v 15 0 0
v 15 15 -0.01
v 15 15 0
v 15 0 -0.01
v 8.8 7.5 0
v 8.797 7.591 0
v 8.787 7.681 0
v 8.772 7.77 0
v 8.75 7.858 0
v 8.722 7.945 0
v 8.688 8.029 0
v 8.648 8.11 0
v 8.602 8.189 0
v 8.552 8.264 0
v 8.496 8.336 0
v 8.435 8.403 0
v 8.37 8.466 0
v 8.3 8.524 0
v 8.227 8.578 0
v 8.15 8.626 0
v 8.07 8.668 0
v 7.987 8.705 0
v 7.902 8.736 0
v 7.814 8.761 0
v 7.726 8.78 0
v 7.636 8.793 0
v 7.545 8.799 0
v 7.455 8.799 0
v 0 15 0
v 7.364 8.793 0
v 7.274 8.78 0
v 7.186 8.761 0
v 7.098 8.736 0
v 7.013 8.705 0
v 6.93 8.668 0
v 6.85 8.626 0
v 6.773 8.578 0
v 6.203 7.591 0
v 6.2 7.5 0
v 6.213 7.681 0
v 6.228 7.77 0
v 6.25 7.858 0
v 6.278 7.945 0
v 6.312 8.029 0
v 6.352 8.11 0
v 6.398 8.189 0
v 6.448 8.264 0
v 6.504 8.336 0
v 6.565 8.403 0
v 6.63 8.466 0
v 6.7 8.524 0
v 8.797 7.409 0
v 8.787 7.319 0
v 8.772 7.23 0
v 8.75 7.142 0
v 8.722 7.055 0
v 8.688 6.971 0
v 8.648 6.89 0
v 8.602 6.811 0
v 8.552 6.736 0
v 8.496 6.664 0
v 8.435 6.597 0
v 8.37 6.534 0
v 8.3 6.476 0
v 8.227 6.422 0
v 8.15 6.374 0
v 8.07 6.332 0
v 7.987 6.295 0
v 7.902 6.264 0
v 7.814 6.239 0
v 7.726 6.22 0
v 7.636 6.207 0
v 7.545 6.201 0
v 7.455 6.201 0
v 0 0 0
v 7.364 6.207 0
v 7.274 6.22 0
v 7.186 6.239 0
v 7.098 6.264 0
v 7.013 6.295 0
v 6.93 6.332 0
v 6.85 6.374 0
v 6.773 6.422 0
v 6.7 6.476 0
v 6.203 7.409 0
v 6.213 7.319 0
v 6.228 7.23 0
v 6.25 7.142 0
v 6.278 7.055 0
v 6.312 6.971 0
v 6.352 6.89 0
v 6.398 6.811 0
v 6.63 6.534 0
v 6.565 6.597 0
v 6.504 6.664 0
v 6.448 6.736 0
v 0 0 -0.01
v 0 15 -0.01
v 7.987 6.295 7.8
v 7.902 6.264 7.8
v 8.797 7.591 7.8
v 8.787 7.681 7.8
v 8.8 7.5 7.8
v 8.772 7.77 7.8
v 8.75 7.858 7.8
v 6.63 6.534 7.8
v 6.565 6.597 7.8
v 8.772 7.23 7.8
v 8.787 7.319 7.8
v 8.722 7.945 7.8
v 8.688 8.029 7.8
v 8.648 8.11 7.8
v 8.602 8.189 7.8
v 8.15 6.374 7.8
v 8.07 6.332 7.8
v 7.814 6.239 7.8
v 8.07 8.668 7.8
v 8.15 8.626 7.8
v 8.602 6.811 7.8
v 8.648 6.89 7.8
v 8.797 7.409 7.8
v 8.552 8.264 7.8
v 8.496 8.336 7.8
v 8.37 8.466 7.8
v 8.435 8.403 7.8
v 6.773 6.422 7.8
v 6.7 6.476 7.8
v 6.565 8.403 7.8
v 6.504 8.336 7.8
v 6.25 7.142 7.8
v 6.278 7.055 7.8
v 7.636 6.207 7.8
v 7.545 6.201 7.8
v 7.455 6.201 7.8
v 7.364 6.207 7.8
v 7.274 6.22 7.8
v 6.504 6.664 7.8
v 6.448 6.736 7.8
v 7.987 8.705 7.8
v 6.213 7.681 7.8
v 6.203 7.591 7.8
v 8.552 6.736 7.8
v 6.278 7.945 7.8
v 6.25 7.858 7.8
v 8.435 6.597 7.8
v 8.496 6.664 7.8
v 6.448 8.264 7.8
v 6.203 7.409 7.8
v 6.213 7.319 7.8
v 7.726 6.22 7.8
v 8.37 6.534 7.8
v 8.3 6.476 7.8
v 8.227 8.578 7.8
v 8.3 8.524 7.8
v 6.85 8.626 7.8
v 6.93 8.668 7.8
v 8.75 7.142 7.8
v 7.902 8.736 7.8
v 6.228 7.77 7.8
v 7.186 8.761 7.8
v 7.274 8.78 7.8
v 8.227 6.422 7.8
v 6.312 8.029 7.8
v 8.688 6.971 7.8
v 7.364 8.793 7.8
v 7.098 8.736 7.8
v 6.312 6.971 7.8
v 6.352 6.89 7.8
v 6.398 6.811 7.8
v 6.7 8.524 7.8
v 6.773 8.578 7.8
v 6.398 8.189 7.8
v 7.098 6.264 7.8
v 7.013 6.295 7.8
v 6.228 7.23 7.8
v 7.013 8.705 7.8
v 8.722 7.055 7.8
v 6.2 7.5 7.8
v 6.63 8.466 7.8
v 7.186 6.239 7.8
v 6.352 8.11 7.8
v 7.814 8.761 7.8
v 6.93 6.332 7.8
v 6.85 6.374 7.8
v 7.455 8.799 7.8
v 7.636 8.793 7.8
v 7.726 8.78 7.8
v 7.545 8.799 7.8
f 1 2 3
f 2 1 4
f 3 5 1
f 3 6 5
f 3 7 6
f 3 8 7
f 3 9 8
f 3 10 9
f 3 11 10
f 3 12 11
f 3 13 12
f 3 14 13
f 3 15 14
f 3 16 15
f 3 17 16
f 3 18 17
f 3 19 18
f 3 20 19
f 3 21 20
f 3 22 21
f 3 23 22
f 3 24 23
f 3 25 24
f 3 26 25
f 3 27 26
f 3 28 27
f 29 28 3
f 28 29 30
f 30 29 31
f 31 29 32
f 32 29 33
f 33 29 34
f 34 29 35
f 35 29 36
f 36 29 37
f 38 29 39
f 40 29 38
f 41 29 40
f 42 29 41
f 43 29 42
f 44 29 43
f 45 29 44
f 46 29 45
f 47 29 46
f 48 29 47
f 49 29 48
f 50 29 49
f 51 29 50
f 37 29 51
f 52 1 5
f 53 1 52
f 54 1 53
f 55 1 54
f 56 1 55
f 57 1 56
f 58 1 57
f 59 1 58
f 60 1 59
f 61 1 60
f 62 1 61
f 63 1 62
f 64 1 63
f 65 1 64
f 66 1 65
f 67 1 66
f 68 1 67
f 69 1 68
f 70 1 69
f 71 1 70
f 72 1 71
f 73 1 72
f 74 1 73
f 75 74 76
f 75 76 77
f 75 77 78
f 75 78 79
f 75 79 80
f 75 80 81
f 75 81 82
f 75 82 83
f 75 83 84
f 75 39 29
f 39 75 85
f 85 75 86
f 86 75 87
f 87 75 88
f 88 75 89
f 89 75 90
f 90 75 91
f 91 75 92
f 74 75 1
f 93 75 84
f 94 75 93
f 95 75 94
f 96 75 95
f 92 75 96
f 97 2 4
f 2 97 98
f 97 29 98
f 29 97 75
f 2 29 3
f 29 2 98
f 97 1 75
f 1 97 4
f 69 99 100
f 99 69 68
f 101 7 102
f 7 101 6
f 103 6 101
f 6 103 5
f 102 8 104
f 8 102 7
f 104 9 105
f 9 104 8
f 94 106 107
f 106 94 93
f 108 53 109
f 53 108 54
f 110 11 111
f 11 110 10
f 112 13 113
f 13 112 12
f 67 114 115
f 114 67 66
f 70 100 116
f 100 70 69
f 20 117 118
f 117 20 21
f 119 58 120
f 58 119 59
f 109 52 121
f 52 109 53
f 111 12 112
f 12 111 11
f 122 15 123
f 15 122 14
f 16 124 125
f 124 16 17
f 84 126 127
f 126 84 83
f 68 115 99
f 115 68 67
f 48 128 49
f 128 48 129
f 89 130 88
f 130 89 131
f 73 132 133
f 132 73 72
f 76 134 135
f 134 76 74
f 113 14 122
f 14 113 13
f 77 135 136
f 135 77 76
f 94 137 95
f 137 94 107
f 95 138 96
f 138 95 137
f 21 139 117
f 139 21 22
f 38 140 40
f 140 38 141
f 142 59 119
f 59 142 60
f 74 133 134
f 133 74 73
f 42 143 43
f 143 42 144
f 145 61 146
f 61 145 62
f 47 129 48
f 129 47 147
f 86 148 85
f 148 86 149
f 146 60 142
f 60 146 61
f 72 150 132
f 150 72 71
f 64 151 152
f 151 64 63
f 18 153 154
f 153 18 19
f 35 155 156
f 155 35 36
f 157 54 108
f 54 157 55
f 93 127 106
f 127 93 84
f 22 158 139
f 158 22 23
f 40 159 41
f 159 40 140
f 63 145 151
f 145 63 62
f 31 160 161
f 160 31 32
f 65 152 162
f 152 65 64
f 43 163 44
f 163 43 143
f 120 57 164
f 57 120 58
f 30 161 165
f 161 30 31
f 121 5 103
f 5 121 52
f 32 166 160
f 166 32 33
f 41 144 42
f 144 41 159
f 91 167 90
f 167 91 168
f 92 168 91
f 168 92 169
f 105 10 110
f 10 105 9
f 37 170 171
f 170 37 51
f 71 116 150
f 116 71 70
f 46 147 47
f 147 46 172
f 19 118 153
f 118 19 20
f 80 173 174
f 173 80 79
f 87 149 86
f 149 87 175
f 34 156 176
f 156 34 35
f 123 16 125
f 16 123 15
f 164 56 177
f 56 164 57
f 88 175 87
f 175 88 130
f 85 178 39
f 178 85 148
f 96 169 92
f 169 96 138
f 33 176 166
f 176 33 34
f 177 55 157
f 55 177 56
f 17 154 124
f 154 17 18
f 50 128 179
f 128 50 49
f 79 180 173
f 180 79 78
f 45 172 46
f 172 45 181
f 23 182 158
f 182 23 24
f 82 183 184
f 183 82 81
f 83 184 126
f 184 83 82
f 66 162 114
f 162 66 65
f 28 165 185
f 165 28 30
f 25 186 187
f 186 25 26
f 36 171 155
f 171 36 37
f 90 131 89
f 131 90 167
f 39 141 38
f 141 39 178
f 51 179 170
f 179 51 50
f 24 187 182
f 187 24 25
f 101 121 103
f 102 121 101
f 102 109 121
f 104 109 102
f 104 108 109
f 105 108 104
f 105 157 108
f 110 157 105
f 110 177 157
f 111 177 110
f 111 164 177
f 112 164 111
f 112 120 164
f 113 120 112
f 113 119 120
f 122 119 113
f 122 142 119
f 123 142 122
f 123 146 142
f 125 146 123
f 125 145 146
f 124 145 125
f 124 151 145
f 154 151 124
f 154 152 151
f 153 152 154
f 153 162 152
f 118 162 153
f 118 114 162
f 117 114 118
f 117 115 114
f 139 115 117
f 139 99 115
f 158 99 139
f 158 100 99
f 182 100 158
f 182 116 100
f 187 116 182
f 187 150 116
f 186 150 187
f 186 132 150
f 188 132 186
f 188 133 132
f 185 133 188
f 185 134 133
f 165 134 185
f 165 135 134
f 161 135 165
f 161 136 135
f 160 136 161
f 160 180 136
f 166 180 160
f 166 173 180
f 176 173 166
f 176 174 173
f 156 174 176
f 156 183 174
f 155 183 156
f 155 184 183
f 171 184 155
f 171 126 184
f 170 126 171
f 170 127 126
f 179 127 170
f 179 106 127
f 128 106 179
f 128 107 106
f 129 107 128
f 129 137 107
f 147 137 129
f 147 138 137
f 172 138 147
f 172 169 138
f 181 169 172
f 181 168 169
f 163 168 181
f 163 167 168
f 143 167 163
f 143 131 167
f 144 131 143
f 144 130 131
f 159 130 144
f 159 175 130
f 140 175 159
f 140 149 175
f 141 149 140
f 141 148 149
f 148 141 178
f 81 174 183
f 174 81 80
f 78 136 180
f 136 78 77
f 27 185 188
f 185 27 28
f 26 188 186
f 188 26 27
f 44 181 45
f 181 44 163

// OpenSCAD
// file: ../Base/Rotation.scad
// Fischertechnik Box Foundation
// Geometry Helpers Rotation

include <PlacementOptions.scad>

// getRotatedSpace(space, rotation=NoRotation)
// Rotates the space dependent on the specified rotation

function getRotatedSpace(space, rotation=NoRotation) = [
    (rotation == Rotate90 || rotation == Rotate270) ? space.y : space.x,
    (rotation == Rotate90 || rotation == Rotate270) ? space.x : space.y
];

// Rotates the given space around the fixed left lower corner
// space = the space the children needs as width/depth list [width,depth]
// rotation = 0 Rotate0 degrees, 1 Rotate90 degrees, 2 Rotate180 degrees, 3 Rotate270 degrees (equivalent to -90)

module RotateFix(space, rotation=NoRotation) {
    dy = (rotation == Rotate0 || rotation == Rotate270) ? 0 :
        (rotation == Rotate90) ? space.x :
        space.y;
    dx = (rotation < Rotate180) ? 0 :
        (rotation == Rotate180) ? space.x :
        space.y;
    
    translate([dx, dy, 0])
        rotate([0, 0, rotations[rotation]])
            children();
}
// file: ../Base/Alignment.scad
// Fischertechnik Box Foundation
// Geometry Helpers Alignment

include <PlacementOptions.scad>

// getAlignedX(elementWidth, spaceWidth, align=AlignRight, offset=0)
// Gets the aligned X offset of an element with the given
// width in the given space.
// elementWidth = The width of the element to positon
// spaceWidth = The space where the element should be aligned
// align = 0 AlignLeft, 1 AlignCenter, 2 AlignRight
// offset = an optional offset from the aligned position. When
// aligned left or centered, then positive values are in X direction.
// When aligned right then positive values are in negative X direction.

function getAlignedX(elementWidth, spaceWidth, align=AlignRight, offset=0) =
    (align == AlignLeft) ?
        offset :
        ((align == AlignCenter) ?
        (spaceWidth - elementWidth)/2 + offset :
        spaceWidth - offset - elementWidth);

// getAlignedY(elementDepth, spaceDepth, align=AlignTop, offset=0)
// Gets the aligned Y offset of an element with the given
// depth in the given space.
// elementDepth = The depth of the element to positon
// spaceDepth = The space where the element should be aligned
// align = 0 AlignBottom, 1 AlignCenter, 2 AlignTop
// offset = an optional offset from the aligned position. When
// aligned bottom or centered, then positive values are in Y direction.
// When aligned top then positive values are in negative Y direction.

function getAlignedY(elementDepth, spaceDepth, align=AlignTop, offset=0) =
    (align == AlignBottom) ?
        offset :
        ((align == AlignCenter) ?
        (spaceDepth - elementDepth)/2 + offset :
        spaceDepth - offset - elementDepth);
// file: ../Base/PlacementOptions.scad
// Fischertechnik Box Foundation
// Placement Options

// Alignment
NoAlign = 0;
AlignLeft = 1;
AlignBottom = 2;
AlignCenter = 3;
AlignRight = 4;
AlignTop = 5;

// Element rotation degree steps
rotations = [0, -90, -180, -270];

// Rotation
NoRotation = 0;
Rotate0 = 0;
Rotate90 = 1;
Rotate180 = 2;
Rotate270 = 3;

// Docking (seen from above)
NoDock = -1;
DockLeft = 0;
DockTop = 1;
DockRight = 2;
DockCorner = 2;
DockBottom = 3;

// Web corners
LowerLeft = 0;
UpperLeft = 1;
UpperRight = 2;
LowerRight = 3;

// Web position relative to corner
LeftOfCorner = 0;
RightOfCorner = 1;

// Rails direction
Horizontal = true;
Vertical = false;
// file: ../Base/Boxes.scad
// Fischertechnik Box Foundation
// Pre-designed Boxes

use <Constants.scad>

include <PlacementOptions.scad>

box190Width = 190;
box190Depth = 130;
box130Width = 130;
box130Depth = 95;

// Values are from an original ec3 box
topBottomDifference = 1.5;
outerHeight = 40;
baseThickness = 1.8;
innerHeight = outerHeight - baseThickness;
stackExcess = 5.7;
radius = 3.5;
wallThickness = 1.5;
tolerance = 0.2;

boxWallThickness = wallThickness;
boxBaseThickness = baseThickness;
boxWebWidth = 3.0;

// getBoxWallThickness()
// Gets the wall thickness of a Fischertechnik Box
function getBoxWallThickness() = boxWallThickness;

// getBoxUsageHeight(height = 38.2)
// Gets the usable height of a Fischertechnik box
// height = Outer height of the box from the bottom to the upper edge.
function getBoxUsageHeight(height = outerHeight) = height - baseThickness - stackExcess;

// getBoxInnerHeight()
// Gets the inner height of a Fischertechnik box, including the stack excess
function getBoxInnerHeight() = innerHeight;

// getBoxBaseThickness()
// Gets the thickness of the Fischertechnik box base.
function getBoxBaseThickness() = boxBaseThickness;

// getBoxWebWidth()
// Gets the width of a box web
function getBoxWebWidth() = boxWebWidth;

// getBox190Space()
// Gets the usable inner space of a Box 190 as an x/y-list
function getBox190Space() = [
    box190Width - 2*getBoxWallThickness() - topBottomDifference, 
    box190Depth - 2*getBoxWallThickness() - topBottomDifference ];

// RoundedCornerPlate(width, depth, height, radius)
// Creates a body plate with rounded corners for a box. Used
// also to create the complete box with the hull module.
// width = Width of the plate
// depth = depth of the plate 
// height = thickness of the plate
// radius = radius of the rounded corner
module RoundedCornerPlate(width, depth, height, radius) {
    translate([radius, radius])
    hull() {
        w = width-2*radius;
        d = depth-2*radius;
        cube([w, d, height]);
        cylinder(height, r=radius, $fn=getFragments());
        translate([w, 0])
            cylinder(height, r=radius, $fn=getFragments());
        translate([w, d])
            cylinder(height, r=radius, $fn=getFragments());
        translate([0, d])
            cylinder(height, r=radius, $fn=getFragments());
    }
}

// BoxBase(width, depth)
// Creates an empty stackable Fischertechnik compatible box
// width = Outer width of the box (190, 130, ...)
// depth = Outer depth of the box (130, 95, ...)

module BoxBase(width, depth, height=outerHeight) {    
    thinPlate = 0.01;

    innerHeight = height - baseThickness;    
    
    module Body(tolerance=tolerance) {
        hull() {
            // Bottom with tolerance to fit into the original boxes when stacked
            translate([-wallThickness+tolerance, -wallThickness+tolerance, -baseThickness])
                RoundedCornerPlate(width-topBottomDifference-2*tolerance, depth-topBottomDifference-2*tolerance, thinPlate, radius);
            
            // Top
            translate([-wallThickness-topBottomDifference/2, -wallThickness-topBottomDifference/2, innerHeight-thinPlate])
                RoundedCornerPlate(width, depth, thinPlate, radius);
         }
    }

    module Cutoff() {
        hull() {
            coWidth = width - 2*wallThickness;
            coDepth = depth - 2*wallThickness;
            
            // Bottom
            RoundedCornerPlate(coWidth-topBottomDifference, coDepth-topBottomDifference, thinPlate, radius);

            // Top
            translate([-topBottomDifference/2, -topBottomDifference/2, innerHeight+thinPlate]) 
                RoundedCornerPlate(coWidth, coDepth, thinPlate, radius);
        }
    }
    
    difference() {        
        Body();
        Cutoff();
        stackOffset = innerHeight - stackExcess;
        translate([0, 0, stackOffset + baseThickness])
            Body(tolerance=0);
    }
}

// Creates the Fischertechnik empty box 130x190 mm and places it at position 0,0
// 190x130 are the outer sizes, the inner space is slightly smaller. Use getBox190Space() to get the inner sizes.
// The box is positioned that the usable inner space is at the 0,0,0 position.

module Box190() {
    BoxBase(box190Width, box190Depth);
}

// Gets the usable inner space of a Box 130 as an x/y-list
function getBox130Space() = [
    box130Width - 2*getBoxWallThickness() - topBottomDifference, 
    box130Depth - 2*getBoxWallThickness() - topBottomDifference ];

// Creates the Fischertechnik empty box 95x130 mm and places it at position 0,0
// 190x130 are the outer sizes, the inner space is slightly smaller. Use getBox190Space() to get the inner sizes.
// The box is positioned that the usable inner space is at the 0,0,0 position.

module Box130() {
    BoxBase(box130Width, box130Depth);
}

// Creates a web at the specified box walls
// corner 0 = LowerLeft, 1 = UpperLeft, 2 = UpperRight, 3 = LowerRight
// side 0 = LeftOfCorner, 1 = RightOfCorner
// distance = Distance in mm from the corner
// boxSpace = inner width and depth of the box (default: Box 190)
// webWidth = length of the web (default is 3 mms)
// webThickness = thickness of the web (default is 1 mm)
// height = Height of the web (standard is getBoxUsageHeight())
// sink = How much of the web is sunk into the wall

module BoxWeb(
    corner, 
    side, 
    distance, 
    boxSpace=getBox190Space(), 
    webWidth=getBoxWebWidth(), 
    webThickness=1.0, 
    height=getBoxUsageHeight(),
    sink = getBoxWallThickness()/2) {
    width = (corner % 2 == 0) ? 
            (side == LeftOfCorner ? webWidth : webThickness) :
            (side == LeftOfCorner ? webThickness : webWidth);

    depth = (corner % 2 == 0) ? 
            (side == RightOfCorner ? webWidth : webThickness) :
            (side == RightOfCorner ? webThickness : webWidth);
    
    xDiff = corner == LowerLeft ? 
                (side == LeftOfCorner ? -sink : distance) :
            (corner == UpperLeft ?                
                (side == LeftOfCorner ? distance : -sink) :
            (corner == UpperRight ?
                (side == LeftOfCorner ? boxSpace.x-webWidth+sink : boxSpace.x-distance-webThickness) :
                (side == LeftOfCorner ? boxSpace.x-distance-webThickness: boxSpace.x-webWidth+sink)));

    yDiff = corner == LowerLeft ? 
                (side == RightOfCorner ? -sink : distance) :
            (corner == UpperLeft ?
                (side == RightOfCorner ? boxSpace.y-distance-webThickness : boxSpace.y-webWidth+sink) :
            (corner == UpperRight ?
                (side == RightOfCorner ? boxSpace.y-webWidth+sink : boxSpace.y-distance-webThickness) :
                (side == RightOfCorner ? distance : -sink)));
    
    translate([xDiff, yDiff, -getExcess()])
        cube([width, depth, height + 2*getExcess()]);
}
// file: ../Base/Placement.scad
// Fischertechnik Box Foundation
// Geometry Helpers Placement

use <Constants.scad>
use <Alignment.scad>
use <Rotation.scad>
use <Boxes.scad>

include <PlacementOptions.scad>

// Place(x=0, y=0, elementSpace=[0,0], alignX=AlignLeft, alignY=AlignBottom, rotation=Rotate0, boxSpace=getBox190Space())
// Places the child at the specified position
// y = Y-Position. This is a relative position when an X aligment is specified.
// x = X-Position. This is a relative position when an Y aligment is specified.
// elementSpace = space of the element to be placed [x,y]
// alignX = -1=NoAlign, 0 AlignLeft, 1 AlignCenter, 3 AlignRight (elementSpace and boxSpace required!)
// alignY = -1=NoAlign, 2 AlignBottom, 1 AlignCenter, 4 AlignTop (elementSpace and boxSpace required!)
// rotation = 0 Rotate0 0 degrees, 1 Rotate90 90 degrees, 
// 2 Rotate180 180 degrees, 3 Rotate270 270 degrees (equivalent to -90)
// boxSpace = Inner space of the box where the placement occurs [x,y] - default is Box 190x130 inner space

module Place(x=0, y=0, elementSpace=[0,0], 
  alignX=AlignLeft, alignY=AlignBottom, 
  rotation=NoRotation, boxSpace=getBox190Space()) {

    module Position(x, y, space, rotation=Rotate0) {
        translate([x, y, 0])
            RotateFix(space, rotation)
                children();
    }

    space = getRotatedSpace(elementSpace, rotation);
    alignedX = getAlignedX(space.x, boxSpace.x, alignX, x);
    alignedY = getAlignedY(space.y, boxSpace.y, alignY, y);
    Position(alignedX, alignedY, elementSpace, rotation)
        children();
}

// Center(space=getBox130Space(), elementSpace=[0,0])
// space = Space where the children is centered. For cylinder use centered=true and no elementSpace.
// elementSpace = space of the element to be centered [x,y]

module Center(space=getBox190Space(), elementSpace=[0,0]) {
    Place(elementSpace=elementSpace, boxSpace=space, alignX=AlignCenter, alignY=AlignCenter)
        children();
}

// CenterHorizontal(width=0, y=0, offset=0, space=getBox130Space())
// width = Width of the element to be placed.
// y = Y position of the element
// offset = Offset from the center position (negative will be left of the center)
// space = Space where the element is placed

module CenterHorizontal(width=0, y=0, offset=0, space=getBox190Space()) {
    Place(x=offset, y=y, elementSpace=[width, 0], boxSpace=space, alignX=AlignCenter)
        children(0);
}

// CenterVertical(depth=0, x=0, offset=0, space=getBox130Space())
// depth = Depth of the element to be placed.
// x = X position of the element
// offset = Offset from the center position (negative will be down of the center)
// space = Space where the element is placed

module CenterVertical(depth=0, x=0, offset=0, space=getBox190Space()) {
    Place(x=x, y=offset, elementSpace=[0, depth], boxSpace=space, alignY=AlignCenter)
        children(0);
}

// getIsVertical(align)
// True if the specified alignment needs a vertical orientation for a divider (AlignRight, AlignLeft)

function getIsVertical(align) = (align == AlignRight || align == AlignLeft);

// getIsHorizontal(align)
// True if the specified alignment needs a horizontal orientation for a divider (AlignTop, AlignBottom)

function getIsHorizontal(align) = (align == AlignTop || align == AlignBottom);
// file: ../Base/Constants.scad
// Fischertechnik Box Foundation
// Constants

// Constant values necessary for multiple elements

// Base constants
dividerThickness = 1.2;
excess = 0.01;
fragments = 90;
tolerance = 0.8;

// Gets the thickness of a divider 
function getDividerThickness() = dividerThickness;

// Gets the excess that is used to merge walls into each other
function getExcess() = excess;

// Gets amount of fragments of a cylinder
function getFragments() = fragments;

// Gets the inner tolerance of a frame to each side
function getTolerance() = tolerance;


// Fischertechnik specific constants
axisDiameter = 4;
axisBottomDiameter = axisDiameter + 1;
axisTolerance = 0.2;
axisLockingLength = 8;

// Gets axis diameter of Fischertechnik axis
function getAxisDiameter() = axisDiameter;

// Gets axis diameter tolerance (subtracted for element axis)
function getAxisTolerance() = axisTolerance;

// Gets the axis diameter for standing axis
function getStandAxisDiameter() = getAxisDiameter() - getAxisTolerance();

// Gets axis bottom diameter for thicker part at the bottom
function getAxisBottomDiameter() = axisBottomDiameter;

// Gets the lengthh of the locking part of a locking axis
function getAxisLockingLength() = axisLockingLength;

// Studs

studHeight = 2.5;
studTolerance = 0.2;
studRailDistance = 9;   // as in ft 50

// gets the height of a connecting stud
function getStudHeight() = studHeight;

// gets the connecting stud height tolerance
function getStudTolerance() = studTolerance;

// gets the default rail distance for studs
function getStudRailDistance() = studRailDistance;

// Dockable Frame with Edge

standardEdgeDistance = 2.5;
standardWebDistance = 11.5;
standardCornerLength = 15;

// gets the standard distance to the wall of the box for dockable frames with webs
function getStandardEdgeDistance() = standardEdgeDistance;

// gets the standard distance of each web to the corner of the dockable frame
function getStandardWebDistance() = standardWebDistance;

// gets the standard length of the corner walls of a dockable frame
function getStandardCornerLength() = standardCornerLength;

// Tubes

tubeWallFactor = 0.8;

// gets the wall thickness of a tube.
function getTubeWallThickness() = tubeWallFactor * getDividerThickness();

// Small Parts and Divider Frame

smallPartsFrameHeight = 20;

// gets the frame height for docked small parts boxes.
function getSmallPartsFrameHeight() = smallPartsFrameHeight;

// Hubs

hubRingDiameter = 19.5;
hubRingLevelDiameter = 21;

// gets the diameter of a tube matching the inner ring of a wheel
function getHubRingDiameter() = hubRingDiameter;

// gets the diameter of a hub tube with a thicker diameter
function getHubRingLevelDiameter() = hubRingLevelDiameter;

// Struts

strutAddLength = 9.0;
strutDepth = 8.0;

// gets the full length of a strut
function getFullStrutLength(length) = length + strutAddLength;

// gets the radius of the end of a strut
function getStrutEndRadius() = strutAddLength / 2;

// gets the the depth of a strut
function getStrutDepth() = strutDepth;

// Propeller

propellerAxisDiameter = 7.0;
propellerAxisTolerance = 0.2;

// gets the propeller axis outer diameter
function getPropellerAxisDiameter() = propellerAxisDiameter;

// gets the propeller axis printing tolerance
function getPropellerAxisTolerance() = propellerAxisTolerance;
// main file
// Fischertechnik Box Library
// Axis for Dial for Electronic Building Blocks
// 36388

use <../Base/Constants.scad>
use <../ModelBase/Simple.scad>

/* [Hidden] */
space = 15;

// getAxisDialSpace()
// Gets the space the axis for a dial needs as width and depth (.x and .y as a list)

function getAxisDialSpace() = [space, space];

// AxisDial()
// Standing axis for a dial 36388

module AxisDial() {
    height = 7.8;
    axisDiameter = 2.6;
    AxisWithSpace(height, getAxisDialSpace(), diameter=axisDiameter);
}

// Tests
color("lightgray")
AxisDial();
